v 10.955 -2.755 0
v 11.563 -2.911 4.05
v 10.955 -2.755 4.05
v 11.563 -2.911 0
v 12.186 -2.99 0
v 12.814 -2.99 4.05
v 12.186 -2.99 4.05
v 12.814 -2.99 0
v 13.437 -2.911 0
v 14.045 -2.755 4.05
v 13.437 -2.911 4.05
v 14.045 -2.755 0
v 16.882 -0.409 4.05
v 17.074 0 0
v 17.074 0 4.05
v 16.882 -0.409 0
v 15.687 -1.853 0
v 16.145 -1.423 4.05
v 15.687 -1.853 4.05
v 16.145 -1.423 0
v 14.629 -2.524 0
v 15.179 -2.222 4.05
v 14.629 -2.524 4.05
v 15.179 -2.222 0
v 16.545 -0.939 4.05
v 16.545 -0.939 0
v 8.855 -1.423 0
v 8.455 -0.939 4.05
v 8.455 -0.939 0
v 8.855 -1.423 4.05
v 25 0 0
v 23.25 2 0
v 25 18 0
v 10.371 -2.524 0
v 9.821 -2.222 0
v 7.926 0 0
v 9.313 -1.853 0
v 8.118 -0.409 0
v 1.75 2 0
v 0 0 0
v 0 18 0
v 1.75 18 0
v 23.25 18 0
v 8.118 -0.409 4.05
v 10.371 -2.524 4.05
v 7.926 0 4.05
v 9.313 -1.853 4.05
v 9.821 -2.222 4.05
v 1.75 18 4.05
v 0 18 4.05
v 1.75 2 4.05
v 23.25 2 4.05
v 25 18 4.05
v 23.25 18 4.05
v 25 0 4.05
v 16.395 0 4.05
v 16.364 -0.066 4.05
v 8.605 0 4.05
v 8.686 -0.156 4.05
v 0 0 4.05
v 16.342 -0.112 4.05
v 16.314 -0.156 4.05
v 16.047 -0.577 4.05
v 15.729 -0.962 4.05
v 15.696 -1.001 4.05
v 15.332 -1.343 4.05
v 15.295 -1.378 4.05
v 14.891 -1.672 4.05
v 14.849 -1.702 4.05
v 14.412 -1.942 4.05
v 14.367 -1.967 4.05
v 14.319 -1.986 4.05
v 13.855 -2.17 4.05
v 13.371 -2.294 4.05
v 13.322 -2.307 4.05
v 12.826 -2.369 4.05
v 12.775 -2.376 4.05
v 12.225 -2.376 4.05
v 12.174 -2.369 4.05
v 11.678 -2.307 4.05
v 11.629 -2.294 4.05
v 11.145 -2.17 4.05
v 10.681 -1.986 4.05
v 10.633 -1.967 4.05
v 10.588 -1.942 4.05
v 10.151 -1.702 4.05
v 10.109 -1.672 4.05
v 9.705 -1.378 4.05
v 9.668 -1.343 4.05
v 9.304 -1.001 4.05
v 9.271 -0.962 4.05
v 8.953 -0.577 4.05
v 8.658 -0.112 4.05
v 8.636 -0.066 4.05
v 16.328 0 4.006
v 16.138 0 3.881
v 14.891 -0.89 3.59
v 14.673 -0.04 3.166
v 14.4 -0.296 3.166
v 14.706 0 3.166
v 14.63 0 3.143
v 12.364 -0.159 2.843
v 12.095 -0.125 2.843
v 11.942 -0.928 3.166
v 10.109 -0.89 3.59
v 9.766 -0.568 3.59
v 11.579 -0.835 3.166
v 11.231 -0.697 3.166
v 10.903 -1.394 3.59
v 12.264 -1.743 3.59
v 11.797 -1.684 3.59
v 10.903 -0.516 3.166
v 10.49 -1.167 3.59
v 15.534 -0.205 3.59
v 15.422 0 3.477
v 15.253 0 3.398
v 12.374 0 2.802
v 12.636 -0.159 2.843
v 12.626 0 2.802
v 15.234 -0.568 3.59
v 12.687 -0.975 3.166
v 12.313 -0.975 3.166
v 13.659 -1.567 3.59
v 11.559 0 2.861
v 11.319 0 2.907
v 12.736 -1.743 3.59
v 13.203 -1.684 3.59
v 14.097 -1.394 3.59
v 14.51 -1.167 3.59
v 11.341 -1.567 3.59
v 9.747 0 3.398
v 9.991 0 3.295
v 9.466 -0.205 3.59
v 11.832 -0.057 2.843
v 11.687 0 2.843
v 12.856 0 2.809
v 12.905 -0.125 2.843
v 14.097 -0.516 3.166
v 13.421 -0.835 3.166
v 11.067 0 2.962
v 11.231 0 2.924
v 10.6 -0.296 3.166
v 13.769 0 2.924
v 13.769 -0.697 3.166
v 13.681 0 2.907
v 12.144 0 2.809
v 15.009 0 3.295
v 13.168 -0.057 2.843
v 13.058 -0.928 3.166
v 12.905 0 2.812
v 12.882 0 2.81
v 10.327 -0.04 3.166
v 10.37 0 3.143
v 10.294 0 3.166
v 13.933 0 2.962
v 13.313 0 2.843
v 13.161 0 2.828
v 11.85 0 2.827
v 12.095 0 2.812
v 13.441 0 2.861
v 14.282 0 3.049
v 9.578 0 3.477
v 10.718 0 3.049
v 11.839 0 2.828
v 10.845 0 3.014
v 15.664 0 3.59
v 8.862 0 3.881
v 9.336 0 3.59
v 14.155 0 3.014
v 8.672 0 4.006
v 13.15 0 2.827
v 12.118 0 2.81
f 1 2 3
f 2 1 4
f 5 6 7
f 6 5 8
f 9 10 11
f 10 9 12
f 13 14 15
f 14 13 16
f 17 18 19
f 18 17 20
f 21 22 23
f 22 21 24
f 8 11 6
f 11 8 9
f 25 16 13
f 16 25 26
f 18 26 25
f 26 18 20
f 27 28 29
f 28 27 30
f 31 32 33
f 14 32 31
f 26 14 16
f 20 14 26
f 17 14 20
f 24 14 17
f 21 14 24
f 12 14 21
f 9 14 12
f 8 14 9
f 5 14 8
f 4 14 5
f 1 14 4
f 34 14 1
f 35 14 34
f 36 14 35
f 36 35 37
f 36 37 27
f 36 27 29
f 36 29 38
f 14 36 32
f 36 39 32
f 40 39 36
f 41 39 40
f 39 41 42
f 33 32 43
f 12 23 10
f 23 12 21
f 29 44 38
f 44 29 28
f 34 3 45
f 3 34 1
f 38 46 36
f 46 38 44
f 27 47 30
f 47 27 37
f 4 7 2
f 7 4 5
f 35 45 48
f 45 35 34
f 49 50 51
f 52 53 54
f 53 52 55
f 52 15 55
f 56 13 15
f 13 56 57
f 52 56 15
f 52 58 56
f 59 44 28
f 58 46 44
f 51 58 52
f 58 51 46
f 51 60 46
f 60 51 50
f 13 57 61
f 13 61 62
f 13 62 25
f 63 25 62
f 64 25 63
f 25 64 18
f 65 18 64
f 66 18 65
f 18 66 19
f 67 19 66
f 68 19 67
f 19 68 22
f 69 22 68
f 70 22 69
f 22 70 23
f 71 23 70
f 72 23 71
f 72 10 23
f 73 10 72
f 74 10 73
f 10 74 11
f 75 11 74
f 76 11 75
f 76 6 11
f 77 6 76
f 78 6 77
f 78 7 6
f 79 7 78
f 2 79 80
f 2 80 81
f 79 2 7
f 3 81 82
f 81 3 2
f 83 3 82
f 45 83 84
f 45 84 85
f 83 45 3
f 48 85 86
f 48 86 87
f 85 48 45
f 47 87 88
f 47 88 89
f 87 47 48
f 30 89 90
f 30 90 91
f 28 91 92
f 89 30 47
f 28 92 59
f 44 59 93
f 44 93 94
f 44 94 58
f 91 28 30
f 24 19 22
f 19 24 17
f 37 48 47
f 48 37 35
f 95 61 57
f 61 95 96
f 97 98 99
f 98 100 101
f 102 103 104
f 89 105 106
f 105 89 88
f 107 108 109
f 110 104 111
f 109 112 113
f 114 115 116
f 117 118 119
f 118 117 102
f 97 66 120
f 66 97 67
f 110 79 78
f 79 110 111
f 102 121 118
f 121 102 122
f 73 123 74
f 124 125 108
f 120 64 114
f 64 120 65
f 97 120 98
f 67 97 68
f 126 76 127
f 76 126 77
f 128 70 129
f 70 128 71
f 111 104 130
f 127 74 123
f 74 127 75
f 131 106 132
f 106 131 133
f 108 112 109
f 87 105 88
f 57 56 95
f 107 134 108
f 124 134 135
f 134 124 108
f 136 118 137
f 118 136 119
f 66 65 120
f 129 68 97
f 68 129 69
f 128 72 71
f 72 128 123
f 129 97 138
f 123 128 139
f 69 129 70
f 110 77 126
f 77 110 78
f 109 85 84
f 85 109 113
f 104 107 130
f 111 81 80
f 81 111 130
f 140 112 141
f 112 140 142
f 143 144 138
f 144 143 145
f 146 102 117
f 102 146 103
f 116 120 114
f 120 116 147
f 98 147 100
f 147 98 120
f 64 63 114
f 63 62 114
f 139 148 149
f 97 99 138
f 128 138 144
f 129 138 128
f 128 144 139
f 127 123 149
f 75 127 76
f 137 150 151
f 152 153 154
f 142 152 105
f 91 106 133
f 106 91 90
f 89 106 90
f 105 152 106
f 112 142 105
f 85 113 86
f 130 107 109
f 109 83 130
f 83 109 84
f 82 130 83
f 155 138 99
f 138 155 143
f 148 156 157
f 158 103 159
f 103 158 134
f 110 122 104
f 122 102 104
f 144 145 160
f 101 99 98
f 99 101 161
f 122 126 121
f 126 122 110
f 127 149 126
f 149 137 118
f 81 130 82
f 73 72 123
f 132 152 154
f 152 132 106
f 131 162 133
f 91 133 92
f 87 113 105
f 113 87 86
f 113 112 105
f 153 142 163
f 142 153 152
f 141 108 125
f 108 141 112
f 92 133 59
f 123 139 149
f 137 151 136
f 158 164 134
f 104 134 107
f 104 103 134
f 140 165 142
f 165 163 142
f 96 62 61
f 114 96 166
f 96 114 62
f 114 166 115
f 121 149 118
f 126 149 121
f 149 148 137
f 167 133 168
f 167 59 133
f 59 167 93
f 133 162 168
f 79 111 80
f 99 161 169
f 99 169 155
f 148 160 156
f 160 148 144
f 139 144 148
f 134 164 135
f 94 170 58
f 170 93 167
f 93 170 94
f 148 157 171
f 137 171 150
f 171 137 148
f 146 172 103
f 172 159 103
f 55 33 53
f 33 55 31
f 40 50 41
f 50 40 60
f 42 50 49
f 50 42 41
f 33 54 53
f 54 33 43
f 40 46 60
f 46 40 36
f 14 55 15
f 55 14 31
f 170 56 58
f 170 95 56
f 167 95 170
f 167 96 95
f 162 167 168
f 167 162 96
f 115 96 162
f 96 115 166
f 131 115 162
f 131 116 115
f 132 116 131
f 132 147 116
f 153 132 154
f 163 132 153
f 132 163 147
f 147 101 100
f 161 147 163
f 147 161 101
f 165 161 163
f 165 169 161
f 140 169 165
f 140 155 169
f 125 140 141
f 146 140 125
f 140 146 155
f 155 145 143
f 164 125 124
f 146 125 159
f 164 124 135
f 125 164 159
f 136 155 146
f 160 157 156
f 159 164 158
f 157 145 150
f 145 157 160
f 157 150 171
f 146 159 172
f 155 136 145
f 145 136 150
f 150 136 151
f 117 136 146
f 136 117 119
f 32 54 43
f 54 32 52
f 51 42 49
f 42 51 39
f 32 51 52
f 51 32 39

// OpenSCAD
baseWidth = 25;
baseDepth = 18;
baseHeight = 4.05;

cutoutWidth = 21.5;
cutoutDepthOffset = 2;
cutoutHeight = 5;

tabR = 5;
tabOut = 2;

thumbDent = 7;
thumbDentOffset = 9.5;

$fn=50;

difference () {
  union () {
  // outside
    cube([baseWidth,baseDepth,baseHeight], 0);
  // tab
    translate([baseWidth/2,tabOut,0])
    difference() {
      cylinder(h=baseHeight, r=tabR);
      translate([0, 0, thumbDentOffset]) sphere(r=thumbDent);
    }
  };

  // cut
  translate([(baseWidth-cutoutWidth)/2, cutoutDepthOffset, 0]) 
    cube([cutoutWidth,baseDepth,cutoutHeight], -1);

};
 
